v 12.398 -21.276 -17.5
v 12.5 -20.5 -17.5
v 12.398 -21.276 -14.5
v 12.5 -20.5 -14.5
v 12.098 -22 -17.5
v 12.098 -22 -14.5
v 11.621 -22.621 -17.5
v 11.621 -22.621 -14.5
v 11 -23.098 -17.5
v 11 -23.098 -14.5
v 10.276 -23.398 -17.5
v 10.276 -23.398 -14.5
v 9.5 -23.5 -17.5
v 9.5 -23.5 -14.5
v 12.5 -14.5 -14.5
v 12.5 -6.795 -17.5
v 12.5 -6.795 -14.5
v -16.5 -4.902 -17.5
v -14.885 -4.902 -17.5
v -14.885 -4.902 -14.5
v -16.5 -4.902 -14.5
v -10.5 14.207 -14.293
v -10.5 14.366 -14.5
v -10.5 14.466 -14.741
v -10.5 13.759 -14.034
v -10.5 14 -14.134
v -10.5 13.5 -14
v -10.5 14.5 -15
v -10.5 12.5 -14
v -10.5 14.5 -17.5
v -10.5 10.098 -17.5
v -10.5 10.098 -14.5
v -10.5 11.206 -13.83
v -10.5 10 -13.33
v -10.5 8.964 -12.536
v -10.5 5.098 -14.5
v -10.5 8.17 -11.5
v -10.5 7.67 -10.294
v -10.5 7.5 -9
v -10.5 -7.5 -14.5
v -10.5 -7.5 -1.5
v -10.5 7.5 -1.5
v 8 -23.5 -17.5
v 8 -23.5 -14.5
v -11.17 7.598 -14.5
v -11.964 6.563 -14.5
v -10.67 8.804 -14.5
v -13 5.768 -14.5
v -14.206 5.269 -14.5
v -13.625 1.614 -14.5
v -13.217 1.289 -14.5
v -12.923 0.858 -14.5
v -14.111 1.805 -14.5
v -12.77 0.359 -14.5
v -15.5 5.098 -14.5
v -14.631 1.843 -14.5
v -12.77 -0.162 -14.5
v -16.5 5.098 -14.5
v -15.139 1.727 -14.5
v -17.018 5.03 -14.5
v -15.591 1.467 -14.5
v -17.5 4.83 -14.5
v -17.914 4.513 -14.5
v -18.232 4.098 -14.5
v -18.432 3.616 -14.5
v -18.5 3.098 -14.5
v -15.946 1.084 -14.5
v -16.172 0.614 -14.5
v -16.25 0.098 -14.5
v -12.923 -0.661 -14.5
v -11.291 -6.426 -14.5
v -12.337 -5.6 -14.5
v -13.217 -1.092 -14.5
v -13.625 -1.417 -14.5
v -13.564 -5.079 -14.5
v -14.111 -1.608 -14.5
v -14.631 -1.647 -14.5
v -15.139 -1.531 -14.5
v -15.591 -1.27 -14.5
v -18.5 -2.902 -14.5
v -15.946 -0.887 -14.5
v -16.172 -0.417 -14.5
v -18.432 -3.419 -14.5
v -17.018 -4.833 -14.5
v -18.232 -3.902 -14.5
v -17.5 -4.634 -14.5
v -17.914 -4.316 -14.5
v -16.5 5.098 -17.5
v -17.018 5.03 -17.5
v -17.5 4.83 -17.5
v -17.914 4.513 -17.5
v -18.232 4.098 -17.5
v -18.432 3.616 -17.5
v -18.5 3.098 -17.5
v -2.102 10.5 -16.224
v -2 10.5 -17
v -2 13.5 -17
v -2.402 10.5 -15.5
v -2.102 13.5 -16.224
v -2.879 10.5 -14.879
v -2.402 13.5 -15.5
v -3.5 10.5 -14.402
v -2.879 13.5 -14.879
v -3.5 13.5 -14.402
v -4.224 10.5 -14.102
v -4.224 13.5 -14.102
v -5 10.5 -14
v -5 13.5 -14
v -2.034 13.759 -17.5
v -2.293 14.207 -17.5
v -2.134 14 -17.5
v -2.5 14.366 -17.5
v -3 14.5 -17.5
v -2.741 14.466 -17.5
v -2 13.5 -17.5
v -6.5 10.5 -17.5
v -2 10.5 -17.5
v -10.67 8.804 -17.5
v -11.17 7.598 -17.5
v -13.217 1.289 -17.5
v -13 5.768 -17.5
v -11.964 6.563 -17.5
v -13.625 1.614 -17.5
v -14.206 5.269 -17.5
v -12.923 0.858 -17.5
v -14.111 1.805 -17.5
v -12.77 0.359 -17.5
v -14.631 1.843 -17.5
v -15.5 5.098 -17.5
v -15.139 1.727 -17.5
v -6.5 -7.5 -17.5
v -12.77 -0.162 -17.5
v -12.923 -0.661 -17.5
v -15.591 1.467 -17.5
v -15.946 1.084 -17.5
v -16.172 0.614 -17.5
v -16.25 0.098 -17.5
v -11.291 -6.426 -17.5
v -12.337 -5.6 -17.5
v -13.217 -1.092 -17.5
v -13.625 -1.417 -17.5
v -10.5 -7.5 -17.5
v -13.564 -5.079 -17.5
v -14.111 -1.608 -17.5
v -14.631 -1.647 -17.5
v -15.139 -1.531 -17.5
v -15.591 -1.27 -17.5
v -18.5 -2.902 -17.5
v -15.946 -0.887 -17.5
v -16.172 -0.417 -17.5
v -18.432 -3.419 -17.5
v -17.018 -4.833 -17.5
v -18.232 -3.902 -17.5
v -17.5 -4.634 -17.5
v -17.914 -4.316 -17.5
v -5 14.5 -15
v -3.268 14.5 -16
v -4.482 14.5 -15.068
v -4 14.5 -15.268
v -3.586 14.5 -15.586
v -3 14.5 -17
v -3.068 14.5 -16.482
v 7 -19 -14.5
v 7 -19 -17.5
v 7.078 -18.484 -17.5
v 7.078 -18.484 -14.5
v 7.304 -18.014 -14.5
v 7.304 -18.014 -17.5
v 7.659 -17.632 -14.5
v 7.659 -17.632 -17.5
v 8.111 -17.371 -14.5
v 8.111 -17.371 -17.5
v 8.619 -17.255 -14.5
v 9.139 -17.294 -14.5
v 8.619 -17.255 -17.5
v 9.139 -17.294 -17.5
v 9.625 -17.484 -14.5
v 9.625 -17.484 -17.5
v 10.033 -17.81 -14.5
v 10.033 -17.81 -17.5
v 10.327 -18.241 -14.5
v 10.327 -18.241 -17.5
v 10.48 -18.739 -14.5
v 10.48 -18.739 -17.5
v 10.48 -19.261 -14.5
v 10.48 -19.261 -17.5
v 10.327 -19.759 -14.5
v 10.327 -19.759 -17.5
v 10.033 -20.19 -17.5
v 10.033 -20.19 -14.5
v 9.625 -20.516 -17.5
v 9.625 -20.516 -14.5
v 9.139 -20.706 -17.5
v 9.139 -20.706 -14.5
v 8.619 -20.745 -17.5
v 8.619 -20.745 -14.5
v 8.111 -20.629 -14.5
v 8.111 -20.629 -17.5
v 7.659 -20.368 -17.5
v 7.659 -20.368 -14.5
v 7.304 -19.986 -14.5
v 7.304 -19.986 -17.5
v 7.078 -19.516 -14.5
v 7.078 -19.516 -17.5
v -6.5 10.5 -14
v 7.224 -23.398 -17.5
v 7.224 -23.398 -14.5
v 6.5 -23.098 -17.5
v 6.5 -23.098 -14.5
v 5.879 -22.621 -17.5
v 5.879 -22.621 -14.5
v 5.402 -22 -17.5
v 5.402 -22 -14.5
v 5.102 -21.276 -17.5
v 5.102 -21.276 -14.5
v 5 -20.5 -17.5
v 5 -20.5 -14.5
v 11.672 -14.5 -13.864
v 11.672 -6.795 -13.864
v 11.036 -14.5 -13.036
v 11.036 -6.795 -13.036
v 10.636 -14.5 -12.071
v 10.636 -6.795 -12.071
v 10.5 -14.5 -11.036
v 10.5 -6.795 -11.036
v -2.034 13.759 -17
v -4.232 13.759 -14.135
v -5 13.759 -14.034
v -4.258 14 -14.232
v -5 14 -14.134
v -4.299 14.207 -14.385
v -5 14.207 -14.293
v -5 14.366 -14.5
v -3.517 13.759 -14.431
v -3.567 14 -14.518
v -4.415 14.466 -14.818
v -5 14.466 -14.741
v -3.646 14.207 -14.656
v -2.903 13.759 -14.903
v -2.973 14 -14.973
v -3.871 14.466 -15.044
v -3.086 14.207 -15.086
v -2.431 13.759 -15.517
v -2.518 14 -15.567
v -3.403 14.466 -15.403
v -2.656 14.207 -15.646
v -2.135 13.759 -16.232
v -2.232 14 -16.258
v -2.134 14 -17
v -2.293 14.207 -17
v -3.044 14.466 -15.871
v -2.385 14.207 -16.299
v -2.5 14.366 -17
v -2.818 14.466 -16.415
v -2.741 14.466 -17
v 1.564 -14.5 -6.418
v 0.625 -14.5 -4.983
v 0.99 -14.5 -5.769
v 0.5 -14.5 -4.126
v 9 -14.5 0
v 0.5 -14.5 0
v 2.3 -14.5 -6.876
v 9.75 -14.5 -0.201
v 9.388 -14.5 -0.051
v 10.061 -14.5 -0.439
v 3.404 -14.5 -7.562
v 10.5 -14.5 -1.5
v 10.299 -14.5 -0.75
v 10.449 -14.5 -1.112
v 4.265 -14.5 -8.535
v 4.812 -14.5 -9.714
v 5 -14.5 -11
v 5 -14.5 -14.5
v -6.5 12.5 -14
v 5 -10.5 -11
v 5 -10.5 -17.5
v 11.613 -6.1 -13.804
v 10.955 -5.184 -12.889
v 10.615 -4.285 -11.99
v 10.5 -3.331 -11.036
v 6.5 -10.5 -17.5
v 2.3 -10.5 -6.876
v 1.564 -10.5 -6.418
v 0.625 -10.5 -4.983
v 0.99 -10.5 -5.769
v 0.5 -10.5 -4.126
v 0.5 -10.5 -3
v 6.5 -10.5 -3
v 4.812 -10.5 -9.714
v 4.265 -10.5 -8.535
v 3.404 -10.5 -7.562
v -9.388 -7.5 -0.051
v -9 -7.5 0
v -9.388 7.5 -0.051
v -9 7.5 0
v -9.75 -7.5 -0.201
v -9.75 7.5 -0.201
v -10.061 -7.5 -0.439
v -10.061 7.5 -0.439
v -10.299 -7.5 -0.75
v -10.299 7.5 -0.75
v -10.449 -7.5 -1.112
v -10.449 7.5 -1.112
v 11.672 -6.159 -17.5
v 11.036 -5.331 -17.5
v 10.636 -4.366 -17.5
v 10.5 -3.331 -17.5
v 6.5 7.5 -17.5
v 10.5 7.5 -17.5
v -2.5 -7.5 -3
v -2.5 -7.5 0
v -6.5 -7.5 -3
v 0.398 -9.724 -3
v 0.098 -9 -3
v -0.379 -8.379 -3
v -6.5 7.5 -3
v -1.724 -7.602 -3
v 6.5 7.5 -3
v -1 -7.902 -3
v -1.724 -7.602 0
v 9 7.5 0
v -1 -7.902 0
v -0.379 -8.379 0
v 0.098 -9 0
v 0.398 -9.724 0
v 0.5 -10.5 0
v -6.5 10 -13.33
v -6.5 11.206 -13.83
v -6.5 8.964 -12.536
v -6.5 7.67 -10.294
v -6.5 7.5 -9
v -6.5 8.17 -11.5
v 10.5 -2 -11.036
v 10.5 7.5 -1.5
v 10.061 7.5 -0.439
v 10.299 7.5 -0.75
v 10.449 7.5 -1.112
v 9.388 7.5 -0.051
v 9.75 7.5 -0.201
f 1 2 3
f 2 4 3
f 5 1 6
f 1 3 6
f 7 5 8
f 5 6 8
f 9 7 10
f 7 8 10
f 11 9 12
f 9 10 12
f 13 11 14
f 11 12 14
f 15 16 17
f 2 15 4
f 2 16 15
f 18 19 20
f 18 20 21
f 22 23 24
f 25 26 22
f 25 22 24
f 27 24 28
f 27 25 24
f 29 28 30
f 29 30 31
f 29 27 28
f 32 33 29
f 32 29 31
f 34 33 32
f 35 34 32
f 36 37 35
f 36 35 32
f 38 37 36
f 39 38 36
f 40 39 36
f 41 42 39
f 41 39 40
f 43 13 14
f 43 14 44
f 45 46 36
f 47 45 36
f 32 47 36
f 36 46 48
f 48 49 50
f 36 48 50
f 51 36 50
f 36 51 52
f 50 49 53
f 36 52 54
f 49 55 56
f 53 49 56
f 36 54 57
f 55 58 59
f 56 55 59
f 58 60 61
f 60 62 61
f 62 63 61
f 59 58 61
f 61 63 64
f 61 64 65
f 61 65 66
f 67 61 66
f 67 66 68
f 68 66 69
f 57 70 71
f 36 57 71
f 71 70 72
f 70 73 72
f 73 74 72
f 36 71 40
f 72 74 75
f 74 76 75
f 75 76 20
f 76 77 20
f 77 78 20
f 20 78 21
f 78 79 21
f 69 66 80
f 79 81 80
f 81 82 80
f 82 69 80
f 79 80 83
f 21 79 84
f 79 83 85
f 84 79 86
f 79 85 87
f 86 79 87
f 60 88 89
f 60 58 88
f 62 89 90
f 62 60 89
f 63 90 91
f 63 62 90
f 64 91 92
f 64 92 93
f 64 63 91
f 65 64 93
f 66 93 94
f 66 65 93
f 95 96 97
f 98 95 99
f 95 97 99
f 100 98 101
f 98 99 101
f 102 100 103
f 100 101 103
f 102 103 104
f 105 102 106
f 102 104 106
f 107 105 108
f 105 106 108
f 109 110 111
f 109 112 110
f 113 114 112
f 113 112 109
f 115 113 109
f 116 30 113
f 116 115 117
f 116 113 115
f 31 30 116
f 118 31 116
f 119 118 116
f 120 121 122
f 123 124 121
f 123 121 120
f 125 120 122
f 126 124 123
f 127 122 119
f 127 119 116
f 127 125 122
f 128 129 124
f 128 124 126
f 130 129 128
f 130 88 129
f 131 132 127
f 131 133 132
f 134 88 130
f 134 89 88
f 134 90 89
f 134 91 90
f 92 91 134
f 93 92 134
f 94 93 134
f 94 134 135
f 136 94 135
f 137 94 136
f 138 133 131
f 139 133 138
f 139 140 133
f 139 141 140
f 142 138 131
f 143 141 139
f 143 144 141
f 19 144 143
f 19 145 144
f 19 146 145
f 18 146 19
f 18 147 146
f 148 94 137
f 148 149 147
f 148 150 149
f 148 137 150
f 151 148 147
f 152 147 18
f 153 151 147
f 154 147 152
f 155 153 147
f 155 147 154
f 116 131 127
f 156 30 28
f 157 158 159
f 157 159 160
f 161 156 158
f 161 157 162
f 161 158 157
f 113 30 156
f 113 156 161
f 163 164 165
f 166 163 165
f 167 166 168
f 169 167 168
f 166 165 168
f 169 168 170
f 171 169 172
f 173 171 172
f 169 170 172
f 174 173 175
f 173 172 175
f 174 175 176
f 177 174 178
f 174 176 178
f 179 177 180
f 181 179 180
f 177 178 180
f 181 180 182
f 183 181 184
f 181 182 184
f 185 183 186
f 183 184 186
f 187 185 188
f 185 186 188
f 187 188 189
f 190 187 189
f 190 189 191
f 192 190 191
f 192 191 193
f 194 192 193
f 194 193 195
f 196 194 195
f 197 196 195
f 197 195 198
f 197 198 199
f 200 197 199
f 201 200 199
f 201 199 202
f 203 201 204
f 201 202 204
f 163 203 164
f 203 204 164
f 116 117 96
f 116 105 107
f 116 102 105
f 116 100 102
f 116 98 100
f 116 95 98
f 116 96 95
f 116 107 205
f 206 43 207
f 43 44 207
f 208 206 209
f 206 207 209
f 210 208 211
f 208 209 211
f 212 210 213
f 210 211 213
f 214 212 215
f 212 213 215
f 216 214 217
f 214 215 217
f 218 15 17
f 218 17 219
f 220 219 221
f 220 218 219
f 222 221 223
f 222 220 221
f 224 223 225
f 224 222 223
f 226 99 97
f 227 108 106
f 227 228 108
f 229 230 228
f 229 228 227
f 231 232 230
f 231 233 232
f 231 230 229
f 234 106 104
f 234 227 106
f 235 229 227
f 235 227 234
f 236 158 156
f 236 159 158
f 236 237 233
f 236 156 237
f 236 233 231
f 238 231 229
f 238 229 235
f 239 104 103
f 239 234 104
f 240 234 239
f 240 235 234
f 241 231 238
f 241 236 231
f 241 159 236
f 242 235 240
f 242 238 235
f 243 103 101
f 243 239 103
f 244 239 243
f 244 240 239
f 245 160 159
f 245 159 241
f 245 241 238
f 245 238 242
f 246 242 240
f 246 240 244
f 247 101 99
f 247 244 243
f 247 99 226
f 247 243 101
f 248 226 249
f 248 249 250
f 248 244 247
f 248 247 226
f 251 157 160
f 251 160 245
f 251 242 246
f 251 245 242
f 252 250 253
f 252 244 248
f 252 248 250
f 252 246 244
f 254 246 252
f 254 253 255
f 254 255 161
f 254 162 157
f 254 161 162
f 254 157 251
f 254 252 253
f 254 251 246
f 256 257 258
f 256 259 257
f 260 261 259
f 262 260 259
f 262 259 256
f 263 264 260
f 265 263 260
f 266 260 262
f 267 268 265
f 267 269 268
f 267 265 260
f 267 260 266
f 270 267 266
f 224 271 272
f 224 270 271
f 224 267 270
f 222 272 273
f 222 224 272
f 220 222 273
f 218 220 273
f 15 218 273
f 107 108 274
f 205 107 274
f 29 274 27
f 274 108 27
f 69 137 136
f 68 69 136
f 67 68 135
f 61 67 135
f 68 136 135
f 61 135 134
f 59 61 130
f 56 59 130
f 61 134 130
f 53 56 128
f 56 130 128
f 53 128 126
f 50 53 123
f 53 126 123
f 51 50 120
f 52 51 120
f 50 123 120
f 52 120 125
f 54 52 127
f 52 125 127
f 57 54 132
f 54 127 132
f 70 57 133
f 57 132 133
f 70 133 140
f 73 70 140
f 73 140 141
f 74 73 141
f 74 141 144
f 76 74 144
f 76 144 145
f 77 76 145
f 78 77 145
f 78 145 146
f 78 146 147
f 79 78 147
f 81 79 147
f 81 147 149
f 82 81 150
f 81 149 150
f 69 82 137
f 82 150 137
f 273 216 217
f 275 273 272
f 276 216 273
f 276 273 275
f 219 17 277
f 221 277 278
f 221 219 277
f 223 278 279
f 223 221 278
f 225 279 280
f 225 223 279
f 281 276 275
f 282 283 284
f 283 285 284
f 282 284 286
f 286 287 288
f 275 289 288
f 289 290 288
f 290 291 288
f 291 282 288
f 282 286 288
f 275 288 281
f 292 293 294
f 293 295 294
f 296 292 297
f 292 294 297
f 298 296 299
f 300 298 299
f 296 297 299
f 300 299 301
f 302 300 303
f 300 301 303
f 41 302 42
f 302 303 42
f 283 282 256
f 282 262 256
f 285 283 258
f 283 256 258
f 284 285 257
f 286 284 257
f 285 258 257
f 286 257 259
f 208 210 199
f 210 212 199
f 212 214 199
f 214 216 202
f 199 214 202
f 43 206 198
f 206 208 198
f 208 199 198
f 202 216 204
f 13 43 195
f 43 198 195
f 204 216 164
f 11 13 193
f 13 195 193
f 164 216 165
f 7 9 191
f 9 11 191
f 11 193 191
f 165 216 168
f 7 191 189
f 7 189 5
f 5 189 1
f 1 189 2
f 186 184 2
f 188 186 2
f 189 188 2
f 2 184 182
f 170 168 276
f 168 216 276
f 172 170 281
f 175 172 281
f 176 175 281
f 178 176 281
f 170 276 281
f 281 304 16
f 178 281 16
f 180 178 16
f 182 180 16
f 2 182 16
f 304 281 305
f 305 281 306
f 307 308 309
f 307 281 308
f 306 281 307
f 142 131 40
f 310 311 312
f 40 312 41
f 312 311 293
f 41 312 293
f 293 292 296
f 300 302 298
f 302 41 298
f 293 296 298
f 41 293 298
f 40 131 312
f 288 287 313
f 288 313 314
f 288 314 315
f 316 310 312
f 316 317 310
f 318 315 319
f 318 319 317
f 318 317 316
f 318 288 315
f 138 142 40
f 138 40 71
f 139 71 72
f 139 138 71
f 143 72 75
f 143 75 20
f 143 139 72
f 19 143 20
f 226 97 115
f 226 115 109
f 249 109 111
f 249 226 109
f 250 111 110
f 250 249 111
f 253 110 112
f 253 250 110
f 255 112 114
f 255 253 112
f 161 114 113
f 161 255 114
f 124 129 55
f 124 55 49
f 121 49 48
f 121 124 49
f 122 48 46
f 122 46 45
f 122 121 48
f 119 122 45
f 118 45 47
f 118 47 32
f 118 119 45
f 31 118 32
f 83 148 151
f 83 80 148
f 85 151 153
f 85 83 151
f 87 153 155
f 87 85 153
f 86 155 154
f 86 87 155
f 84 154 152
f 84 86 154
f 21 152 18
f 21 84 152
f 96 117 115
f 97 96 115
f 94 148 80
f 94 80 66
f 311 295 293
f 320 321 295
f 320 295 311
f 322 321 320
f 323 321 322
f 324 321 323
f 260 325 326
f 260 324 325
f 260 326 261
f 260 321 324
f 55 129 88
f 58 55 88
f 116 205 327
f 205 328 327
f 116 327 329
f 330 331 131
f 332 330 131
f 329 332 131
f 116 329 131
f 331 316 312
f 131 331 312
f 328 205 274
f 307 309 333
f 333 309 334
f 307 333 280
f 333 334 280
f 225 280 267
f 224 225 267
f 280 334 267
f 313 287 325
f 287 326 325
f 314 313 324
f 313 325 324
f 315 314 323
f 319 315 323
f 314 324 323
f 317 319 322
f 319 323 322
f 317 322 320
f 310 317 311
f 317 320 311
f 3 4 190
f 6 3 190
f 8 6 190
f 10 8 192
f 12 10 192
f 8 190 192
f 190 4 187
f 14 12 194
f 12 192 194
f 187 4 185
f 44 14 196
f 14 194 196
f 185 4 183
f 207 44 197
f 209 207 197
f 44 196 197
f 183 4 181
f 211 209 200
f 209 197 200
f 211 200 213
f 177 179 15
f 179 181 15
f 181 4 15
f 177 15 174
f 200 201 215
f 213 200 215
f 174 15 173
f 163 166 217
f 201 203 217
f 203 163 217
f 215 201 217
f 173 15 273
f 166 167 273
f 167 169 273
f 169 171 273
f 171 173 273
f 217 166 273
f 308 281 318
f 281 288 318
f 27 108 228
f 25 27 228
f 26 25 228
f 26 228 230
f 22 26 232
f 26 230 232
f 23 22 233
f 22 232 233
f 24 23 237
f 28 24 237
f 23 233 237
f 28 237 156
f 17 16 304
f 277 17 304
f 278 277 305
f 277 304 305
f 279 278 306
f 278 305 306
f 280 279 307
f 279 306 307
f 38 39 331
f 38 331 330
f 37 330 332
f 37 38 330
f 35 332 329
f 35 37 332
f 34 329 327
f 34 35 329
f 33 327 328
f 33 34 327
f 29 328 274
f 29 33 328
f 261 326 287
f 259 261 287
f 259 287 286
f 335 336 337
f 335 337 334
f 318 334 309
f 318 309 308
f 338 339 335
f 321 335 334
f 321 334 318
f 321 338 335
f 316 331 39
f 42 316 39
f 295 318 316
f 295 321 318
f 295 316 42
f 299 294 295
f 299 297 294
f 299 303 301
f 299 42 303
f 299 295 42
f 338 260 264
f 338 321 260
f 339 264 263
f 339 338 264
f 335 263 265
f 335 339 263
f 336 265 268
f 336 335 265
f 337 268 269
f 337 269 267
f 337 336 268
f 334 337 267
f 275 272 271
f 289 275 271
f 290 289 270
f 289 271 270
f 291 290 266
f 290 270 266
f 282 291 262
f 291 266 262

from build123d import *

# Parameters (mm, degrees)
SKETCH1_W           = 21
SKETCH1_H           = 15
BOSS_EXTRUDE1_DEPTH = 3
SKETCH2_W           = 4
SKETCH2_H           = 15
BOSS_EXTRUDE2_DEPTH = 14.5
SKETCH3_W           = 4
SKETCH3_H           = 7
SKETCH3_W_2         = 4.5
SKETCH3_H_2         = 4
BOSS_EXTRUDE3_DEPTH = 3.5
FILLET1_R           = 1
FILLET2_R           = 3
FILLET3_R           = 5
SKETCH4_W           = 8
SKETCH4_H           = 10
SKETCH4_R           = 1.75
BOSS_EXTRUDE4_DEPTH = 3
FILLET4_R           = 5
FILLET5_R           = 2
SKETCH7_W           = 8
SKETCH7_H           = 4
BOSS_EXTRUDE5_DEPTH = 10
SKETCH8_W           = 4
SKETCH8_H           = 3
BOSS_EXTRUDE6_DEPTH = 8
SKETCH9_R           = 4.5
CUT_EXTRUDE1_DEPTH  = 5
BOSS_EXTRUDE7_DEPTH = 6.5
SKETCH11_R          = 1.75
SKETCH11_W          = 2
SKETCH11_H          = 7.704965023
BOSS_EXTRUDE8_DEPTH = 3
FILLET6_R           = 4
FILLET7_START       = -17.5
FILLET7_DEPTH       = 3
FILLET7_START_2     = -14.5
FILLET7_2_DEPTH     = 3.464101615
FILLET7_START_3     = -6.795034977
FILLET7_3_DEPTH     = 4.795034977
FILLET8_R           = 3
FILLET9_R           = 3
FILLET10_R          = 1.5


with BuildPart() as part:
    # Sketch1 → Boss-Extrude1 (new body)
    with BuildSketch(Plane.XY):
        Rectangle(SKETCH1_W, SKETCH1_H)
    extrude(amount=-BOSS_EXTRUDE1_DEPTH)

    # Sketch2 → Boss-Extrude2 (add)
    with BuildSketch(Plane(origin=(0, 0, -3), x_dir=(-1, 0, 0), z_dir=(0, 0, -1))):
        with Locations((8.5, 0)):
            Rectangle(SKETCH2_W, SKETCH2_H)
        with Locations((-8.5, 0)):
            Rectangle(SKETCH2_W, SKETCH2_H)
    extrude(amount=BOSS_EXTRUDE2_DEPTH)

    # Sketch3 → Boss-Extrude3 (add)
    with BuildSketch(Plane(origin=(0, 0, -17.5), x_dir=(-1, 0, 0), z_dir=(0, 0, -1))):
        with Locations((8.5, 11)):
            Rectangle(SKETCH3_W, SKETCH3_H)
        with Locations((4.25, 12.5)):
            Rectangle(SKETCH3_W_2, SKETCH3_H_2)
    extrude(amount=-BOSS_EXTRUDE3_DEPTH)

    # Fillet1
    fillet1_edges = [part.edges().sort_by_distance(p)[0] for p in [
        (-6.25, 14.5, -14),
        (-2, 14.5, -15.75),
    ]]
    fillet(fillet1_edges, radius=FILLET1_R)

    # Fillet2
    # the kernel refuses this fillet: 3 mm, written as the material it takes off along each edge
    with BuildSketch(Plane(origin=(-5, 14.5, -17), x_dir=(0, 0, 1), z_dir=(-1, 0, 0))) as fillet2_piece_1:
        with BuildLine():
            CenterArc((2, -1), 1, 0, 90)
            Line((3, -1), (3, 0))
            Line((3, 0), (2, 0))
        make_face()
    revolve(axis=Axis((-5, 14.5, -17), (0, 1, 0)), revolution_arc=90, mode=Mode.SUBTRACT)
    with BuildSketch(Plane(origin=(-2, 14.5, -14), x_dir=(0, 0, -1), z_dir=(0, -1, 0))) as fillet2_piece_2:
        with BuildLine():
            CenterArc((FILLET2_R, -FILLET2_R), FILLET2_R, 90, 90)
            Line((0, -FILLET2_R), (0, 0))
            Line((0, 0), (FILLET2_R, 0))
        make_face()
    extrude(amount=11.5, mode=Mode.SUBTRACT)

    # Fillet3
    # the kernel refuses this fillet: 5 mm, written as the material it adds along each edge
    with BuildSketch(Plane(origin=(-10.5, 7.5, -14), x_dir=(0, 1, 0), z_dir=(1, 0, 0))) as fillet3_piece_1:
        with BuildLine():
            CenterArc((FILLET3_R, FILLET3_R), FILLET3_R, 180, 90)
            Line((0, FILLET3_R), (0, 0))
            Line((0, 0), (FILLET3_R, 0))
        make_face()
    extrude(amount=4)

    # Sketch4 → Boss-Extrude4 (add)
    with BuildSketch(Plane(origin=(0, 0, -17.5), x_dir=(-1, 0, 0), z_dir=(0, 0, -1))):
        with Locations((14.5, 0.098378943)):
            Rectangle(SKETCH4_W, SKETCH4_H)
        with Locations((14.5, 0.098378943)):
            Circle(SKETCH4_R, mode=Mode.SUBTRACT)
    extrude(amount=-BOSS_EXTRUDE4_DEPTH)

    # Fillet4
    # the kernel refuses this fillet: 5 mm, written as the material it adds along each edge
    with BuildSketch(Plane(origin=(-10.5, -4.901621057, -17.5), x_dir=(0, -1, 0), z_dir=(0, 0, 1))) as fillet4_piece_1:
        with BuildLine():
            CenterArc((5, -4.385455085), FILLET4_R, 118.706578905, 61.293421095)
            Line((0, -4.385455085), (0, 0))
            Line((0, 0), (2.598378943, 0))
        make_face()
    extrude(amount=3)
    with BuildSketch(Plane(origin=(-10.5, 5.098378943, -17.5), x_dir=(0, 1, 0), z_dir=(0, 0, 1))) as fillet4_piece_2:
        with BuildLine():
            CenterArc((FILLET4_R, FILLET4_R), FILLET4_R, 180, 90)
            Line((0, FILLET4_R), (0, 0))
            Line((0, 0), (FILLET4_R, 0))
        make_face()
    extrude(amount=3)

    # Fillet5
    fillet5_edges = [part.edges().sort_by_distance(p)[0] for p in [
        (-18.5, 5.098378943, -16),
        (-18.5, -4.901621057, -16),
    ]]
    fillet(fillet5_edges, radius=FILLET5_R)

    # Sketch7 → Boss-Extrude5 (add)
    with BuildSketch(Plane(origin=(10.5, 0, 0), x_dir=(0, 0, -1), z_dir=(1, 0, 0))):
        Polygon((3, -7.5), (0, -7.5), (0, -14.5), (3, -14.5), (3, -10.5), align=None)
        with Locations((7, -12.5)):
            Rectangle(SKETCH7_W, SKETCH7_H)
    extrude(amount=-BOSS_EXTRUDE5_DEPTH)

    # Sketch8 → Boss-Extrude6 (add)
    with BuildSketch(Plane(origin=(0, 0, -3), x_dir=(-1, 0, 0), z_dir=(0, 0, -1))):
        with Locations((-8.5, -9)):
            Rectangle(SKETCH8_W, SKETCH8_H)
    extrude(amount=BOSS_EXTRUDE6_DEPTH)

    # Sketch9 → Cut-Extrude1 (cut)
    with BuildSketch(Plane.XZ.offset(14.5)):
        with Locations((0.5, -11)):
            Circle(SKETCH9_R)
    extrude(amount=-CUT_EXTRUDE1_DEPTH, mode=Mode.SUBTRACT)

    # Sketch10 → Boss-Extrude7 (add)
    with BuildSketch(Plane(origin=(0, 0, -11), x_dir=(-1, 0, 0), z_dir=(0, 0, -1))):
        Polygon((-5, -14.5), (-5, -10.5), (-6.5, -10.5), (-6.5, -7.5), (-10.5, -7.5), (-10.5, -14.5), align=None)
    extrude(amount=BOSS_EXTRUDE7_DEPTH)

    # Sketch11 → Boss-Extrude8 (add)
    # profile 1 of 2: a face of its own
    with BuildSketch(Plane(origin=(0, 0, -17.5), x_dir=(-1, 0, 0), z_dir=(0, 0, -1))):
        Polygon((-5, -23.5), (-5, -14.5), (-10.5, -14.5), (-12.5, -14.5), (-12.5, -23.5), align=None)
        with Locations((-8.75, -19)):
            Circle(SKETCH11_R, mode=Mode.SUBTRACT)
    # profile 2 of 2: a face of its own
    with BuildSketch(Plane(origin=(0, 0, -17.5), x_dir=(-1, 0, 0), z_dir=(0, 0, -1))):
        with Locations((-11.5, -10.647517489)):
            Rectangle(SKETCH11_W, SKETCH11_H)
    extrude(amount=-BOSS_EXTRUDE8_DEPTH)

    # Fillet6
    # the kernel refuses this fillet: 4 mm, written as the material it adds along each edge
    with BuildSketch(Plane(origin=(10.5, -14.5, -14.5), x_dir=(0, 0, 1), z_dir=(0, 1, 0))) as fillet6_piece_1:
        with BuildLine():
            CenterArc((3.464101615, 4), FILLET6_R, 210, 60)
            Line((0, 2), (-0.069282032, 1.96))
            ThreePointArc((-0.069282032, 1.96), (-0.08, 1), (-0.08, 0))
            Line((-0.08, 0), (0, -0.08))
            Line((0, -0.08), (3.464101615, -0.08))
            Line((3.464101615, -0.08), (3.464101615, 0))
        make_face()
    extrude(amount=7.704965023)

    # Fillet7: read off the stored shape, not the designer's step
    # Fillet7 outline → Fillet7 (add)
    with BuildSketch(Plane.XY.offset(FILLET7_START)):
        with BuildLine():
            Line((10.5, -6.795034977), (12.5, -6.795034977))
            ThreePointArc((12.5, -6.795034977), (11.035898385, -5.330933362), (10.5, -3.330933362))
            Line((10.5, -3.330933362), (10.5, -6.795034977))
        make_face()
    extrude(amount=FILLET7_DEPTH)

    # Fillet7 2 outline → Fillet7 2 (add)
    with BuildSketch(Plane.XY.offset(FILLET7_START_2)):
        with BuildLine():
            Line((10.5, -6.795034977), (12.5, -6.795034977))
            ThreePointArc((12.5, -6.795034977), (11.035898385, -5.330933362), (10.5, -3.330933362))
            Line((10.5, -3.330933362), (10.5, -6.795034977))
        make_face()
    extrude(amount=FILLET7_2_DEPTH)

    # Fillet7 3 outline → Fillet7 3 (cut)
    with BuildSketch(Plane(origin=(0, 0, 0), x_dir=(1, 0, 0), z_dir=(0, 1, 0)).offset(FILLET7_START_3)):
        with BuildLine():
            ThreePointArc((12.5, 14.5), (11.035898385, 13.035898385), (10.5, 11.035898385))
            Line((10.5, 11.035898385), (14, 11.035898385))
            Line((14, 11.035898385), (14, 15.366025404))
            Line((14, 15.366025404), (12.5, 14.5))
        make_face()
    extrude(amount=FILLET7_3_DEPTH, mode=Mode.SUBTRACT)

    # Fillet8
    fillet8_edges = [part.edges().sort_by_distance(p)[0] for p in [
        (5, -23.5, -16),
        (12.5, -23.5, -16),
    ]]
    fillet(fillet8_edges, radius=FILLET8_R)

    # Fillet9
    fillet9_edges = [part.edges().sort_by_distance(p)[0] for p in [
        (0.5, -7.5, -1.5),
        (0.5, -12.5, -6.5),
    ]]
    fillet(fillet9_edges, radius=FILLET9_R)

    # Fillet10
    fillet10_edges = [part.edges().sort_by_distance(p)[0] for p in [
        (10.5, -3.5, 0),
        (-10.5, 0, 0),
    ]]
    fillet(fillet10_edges, radius=FILLET10_R)


solid = part.part
